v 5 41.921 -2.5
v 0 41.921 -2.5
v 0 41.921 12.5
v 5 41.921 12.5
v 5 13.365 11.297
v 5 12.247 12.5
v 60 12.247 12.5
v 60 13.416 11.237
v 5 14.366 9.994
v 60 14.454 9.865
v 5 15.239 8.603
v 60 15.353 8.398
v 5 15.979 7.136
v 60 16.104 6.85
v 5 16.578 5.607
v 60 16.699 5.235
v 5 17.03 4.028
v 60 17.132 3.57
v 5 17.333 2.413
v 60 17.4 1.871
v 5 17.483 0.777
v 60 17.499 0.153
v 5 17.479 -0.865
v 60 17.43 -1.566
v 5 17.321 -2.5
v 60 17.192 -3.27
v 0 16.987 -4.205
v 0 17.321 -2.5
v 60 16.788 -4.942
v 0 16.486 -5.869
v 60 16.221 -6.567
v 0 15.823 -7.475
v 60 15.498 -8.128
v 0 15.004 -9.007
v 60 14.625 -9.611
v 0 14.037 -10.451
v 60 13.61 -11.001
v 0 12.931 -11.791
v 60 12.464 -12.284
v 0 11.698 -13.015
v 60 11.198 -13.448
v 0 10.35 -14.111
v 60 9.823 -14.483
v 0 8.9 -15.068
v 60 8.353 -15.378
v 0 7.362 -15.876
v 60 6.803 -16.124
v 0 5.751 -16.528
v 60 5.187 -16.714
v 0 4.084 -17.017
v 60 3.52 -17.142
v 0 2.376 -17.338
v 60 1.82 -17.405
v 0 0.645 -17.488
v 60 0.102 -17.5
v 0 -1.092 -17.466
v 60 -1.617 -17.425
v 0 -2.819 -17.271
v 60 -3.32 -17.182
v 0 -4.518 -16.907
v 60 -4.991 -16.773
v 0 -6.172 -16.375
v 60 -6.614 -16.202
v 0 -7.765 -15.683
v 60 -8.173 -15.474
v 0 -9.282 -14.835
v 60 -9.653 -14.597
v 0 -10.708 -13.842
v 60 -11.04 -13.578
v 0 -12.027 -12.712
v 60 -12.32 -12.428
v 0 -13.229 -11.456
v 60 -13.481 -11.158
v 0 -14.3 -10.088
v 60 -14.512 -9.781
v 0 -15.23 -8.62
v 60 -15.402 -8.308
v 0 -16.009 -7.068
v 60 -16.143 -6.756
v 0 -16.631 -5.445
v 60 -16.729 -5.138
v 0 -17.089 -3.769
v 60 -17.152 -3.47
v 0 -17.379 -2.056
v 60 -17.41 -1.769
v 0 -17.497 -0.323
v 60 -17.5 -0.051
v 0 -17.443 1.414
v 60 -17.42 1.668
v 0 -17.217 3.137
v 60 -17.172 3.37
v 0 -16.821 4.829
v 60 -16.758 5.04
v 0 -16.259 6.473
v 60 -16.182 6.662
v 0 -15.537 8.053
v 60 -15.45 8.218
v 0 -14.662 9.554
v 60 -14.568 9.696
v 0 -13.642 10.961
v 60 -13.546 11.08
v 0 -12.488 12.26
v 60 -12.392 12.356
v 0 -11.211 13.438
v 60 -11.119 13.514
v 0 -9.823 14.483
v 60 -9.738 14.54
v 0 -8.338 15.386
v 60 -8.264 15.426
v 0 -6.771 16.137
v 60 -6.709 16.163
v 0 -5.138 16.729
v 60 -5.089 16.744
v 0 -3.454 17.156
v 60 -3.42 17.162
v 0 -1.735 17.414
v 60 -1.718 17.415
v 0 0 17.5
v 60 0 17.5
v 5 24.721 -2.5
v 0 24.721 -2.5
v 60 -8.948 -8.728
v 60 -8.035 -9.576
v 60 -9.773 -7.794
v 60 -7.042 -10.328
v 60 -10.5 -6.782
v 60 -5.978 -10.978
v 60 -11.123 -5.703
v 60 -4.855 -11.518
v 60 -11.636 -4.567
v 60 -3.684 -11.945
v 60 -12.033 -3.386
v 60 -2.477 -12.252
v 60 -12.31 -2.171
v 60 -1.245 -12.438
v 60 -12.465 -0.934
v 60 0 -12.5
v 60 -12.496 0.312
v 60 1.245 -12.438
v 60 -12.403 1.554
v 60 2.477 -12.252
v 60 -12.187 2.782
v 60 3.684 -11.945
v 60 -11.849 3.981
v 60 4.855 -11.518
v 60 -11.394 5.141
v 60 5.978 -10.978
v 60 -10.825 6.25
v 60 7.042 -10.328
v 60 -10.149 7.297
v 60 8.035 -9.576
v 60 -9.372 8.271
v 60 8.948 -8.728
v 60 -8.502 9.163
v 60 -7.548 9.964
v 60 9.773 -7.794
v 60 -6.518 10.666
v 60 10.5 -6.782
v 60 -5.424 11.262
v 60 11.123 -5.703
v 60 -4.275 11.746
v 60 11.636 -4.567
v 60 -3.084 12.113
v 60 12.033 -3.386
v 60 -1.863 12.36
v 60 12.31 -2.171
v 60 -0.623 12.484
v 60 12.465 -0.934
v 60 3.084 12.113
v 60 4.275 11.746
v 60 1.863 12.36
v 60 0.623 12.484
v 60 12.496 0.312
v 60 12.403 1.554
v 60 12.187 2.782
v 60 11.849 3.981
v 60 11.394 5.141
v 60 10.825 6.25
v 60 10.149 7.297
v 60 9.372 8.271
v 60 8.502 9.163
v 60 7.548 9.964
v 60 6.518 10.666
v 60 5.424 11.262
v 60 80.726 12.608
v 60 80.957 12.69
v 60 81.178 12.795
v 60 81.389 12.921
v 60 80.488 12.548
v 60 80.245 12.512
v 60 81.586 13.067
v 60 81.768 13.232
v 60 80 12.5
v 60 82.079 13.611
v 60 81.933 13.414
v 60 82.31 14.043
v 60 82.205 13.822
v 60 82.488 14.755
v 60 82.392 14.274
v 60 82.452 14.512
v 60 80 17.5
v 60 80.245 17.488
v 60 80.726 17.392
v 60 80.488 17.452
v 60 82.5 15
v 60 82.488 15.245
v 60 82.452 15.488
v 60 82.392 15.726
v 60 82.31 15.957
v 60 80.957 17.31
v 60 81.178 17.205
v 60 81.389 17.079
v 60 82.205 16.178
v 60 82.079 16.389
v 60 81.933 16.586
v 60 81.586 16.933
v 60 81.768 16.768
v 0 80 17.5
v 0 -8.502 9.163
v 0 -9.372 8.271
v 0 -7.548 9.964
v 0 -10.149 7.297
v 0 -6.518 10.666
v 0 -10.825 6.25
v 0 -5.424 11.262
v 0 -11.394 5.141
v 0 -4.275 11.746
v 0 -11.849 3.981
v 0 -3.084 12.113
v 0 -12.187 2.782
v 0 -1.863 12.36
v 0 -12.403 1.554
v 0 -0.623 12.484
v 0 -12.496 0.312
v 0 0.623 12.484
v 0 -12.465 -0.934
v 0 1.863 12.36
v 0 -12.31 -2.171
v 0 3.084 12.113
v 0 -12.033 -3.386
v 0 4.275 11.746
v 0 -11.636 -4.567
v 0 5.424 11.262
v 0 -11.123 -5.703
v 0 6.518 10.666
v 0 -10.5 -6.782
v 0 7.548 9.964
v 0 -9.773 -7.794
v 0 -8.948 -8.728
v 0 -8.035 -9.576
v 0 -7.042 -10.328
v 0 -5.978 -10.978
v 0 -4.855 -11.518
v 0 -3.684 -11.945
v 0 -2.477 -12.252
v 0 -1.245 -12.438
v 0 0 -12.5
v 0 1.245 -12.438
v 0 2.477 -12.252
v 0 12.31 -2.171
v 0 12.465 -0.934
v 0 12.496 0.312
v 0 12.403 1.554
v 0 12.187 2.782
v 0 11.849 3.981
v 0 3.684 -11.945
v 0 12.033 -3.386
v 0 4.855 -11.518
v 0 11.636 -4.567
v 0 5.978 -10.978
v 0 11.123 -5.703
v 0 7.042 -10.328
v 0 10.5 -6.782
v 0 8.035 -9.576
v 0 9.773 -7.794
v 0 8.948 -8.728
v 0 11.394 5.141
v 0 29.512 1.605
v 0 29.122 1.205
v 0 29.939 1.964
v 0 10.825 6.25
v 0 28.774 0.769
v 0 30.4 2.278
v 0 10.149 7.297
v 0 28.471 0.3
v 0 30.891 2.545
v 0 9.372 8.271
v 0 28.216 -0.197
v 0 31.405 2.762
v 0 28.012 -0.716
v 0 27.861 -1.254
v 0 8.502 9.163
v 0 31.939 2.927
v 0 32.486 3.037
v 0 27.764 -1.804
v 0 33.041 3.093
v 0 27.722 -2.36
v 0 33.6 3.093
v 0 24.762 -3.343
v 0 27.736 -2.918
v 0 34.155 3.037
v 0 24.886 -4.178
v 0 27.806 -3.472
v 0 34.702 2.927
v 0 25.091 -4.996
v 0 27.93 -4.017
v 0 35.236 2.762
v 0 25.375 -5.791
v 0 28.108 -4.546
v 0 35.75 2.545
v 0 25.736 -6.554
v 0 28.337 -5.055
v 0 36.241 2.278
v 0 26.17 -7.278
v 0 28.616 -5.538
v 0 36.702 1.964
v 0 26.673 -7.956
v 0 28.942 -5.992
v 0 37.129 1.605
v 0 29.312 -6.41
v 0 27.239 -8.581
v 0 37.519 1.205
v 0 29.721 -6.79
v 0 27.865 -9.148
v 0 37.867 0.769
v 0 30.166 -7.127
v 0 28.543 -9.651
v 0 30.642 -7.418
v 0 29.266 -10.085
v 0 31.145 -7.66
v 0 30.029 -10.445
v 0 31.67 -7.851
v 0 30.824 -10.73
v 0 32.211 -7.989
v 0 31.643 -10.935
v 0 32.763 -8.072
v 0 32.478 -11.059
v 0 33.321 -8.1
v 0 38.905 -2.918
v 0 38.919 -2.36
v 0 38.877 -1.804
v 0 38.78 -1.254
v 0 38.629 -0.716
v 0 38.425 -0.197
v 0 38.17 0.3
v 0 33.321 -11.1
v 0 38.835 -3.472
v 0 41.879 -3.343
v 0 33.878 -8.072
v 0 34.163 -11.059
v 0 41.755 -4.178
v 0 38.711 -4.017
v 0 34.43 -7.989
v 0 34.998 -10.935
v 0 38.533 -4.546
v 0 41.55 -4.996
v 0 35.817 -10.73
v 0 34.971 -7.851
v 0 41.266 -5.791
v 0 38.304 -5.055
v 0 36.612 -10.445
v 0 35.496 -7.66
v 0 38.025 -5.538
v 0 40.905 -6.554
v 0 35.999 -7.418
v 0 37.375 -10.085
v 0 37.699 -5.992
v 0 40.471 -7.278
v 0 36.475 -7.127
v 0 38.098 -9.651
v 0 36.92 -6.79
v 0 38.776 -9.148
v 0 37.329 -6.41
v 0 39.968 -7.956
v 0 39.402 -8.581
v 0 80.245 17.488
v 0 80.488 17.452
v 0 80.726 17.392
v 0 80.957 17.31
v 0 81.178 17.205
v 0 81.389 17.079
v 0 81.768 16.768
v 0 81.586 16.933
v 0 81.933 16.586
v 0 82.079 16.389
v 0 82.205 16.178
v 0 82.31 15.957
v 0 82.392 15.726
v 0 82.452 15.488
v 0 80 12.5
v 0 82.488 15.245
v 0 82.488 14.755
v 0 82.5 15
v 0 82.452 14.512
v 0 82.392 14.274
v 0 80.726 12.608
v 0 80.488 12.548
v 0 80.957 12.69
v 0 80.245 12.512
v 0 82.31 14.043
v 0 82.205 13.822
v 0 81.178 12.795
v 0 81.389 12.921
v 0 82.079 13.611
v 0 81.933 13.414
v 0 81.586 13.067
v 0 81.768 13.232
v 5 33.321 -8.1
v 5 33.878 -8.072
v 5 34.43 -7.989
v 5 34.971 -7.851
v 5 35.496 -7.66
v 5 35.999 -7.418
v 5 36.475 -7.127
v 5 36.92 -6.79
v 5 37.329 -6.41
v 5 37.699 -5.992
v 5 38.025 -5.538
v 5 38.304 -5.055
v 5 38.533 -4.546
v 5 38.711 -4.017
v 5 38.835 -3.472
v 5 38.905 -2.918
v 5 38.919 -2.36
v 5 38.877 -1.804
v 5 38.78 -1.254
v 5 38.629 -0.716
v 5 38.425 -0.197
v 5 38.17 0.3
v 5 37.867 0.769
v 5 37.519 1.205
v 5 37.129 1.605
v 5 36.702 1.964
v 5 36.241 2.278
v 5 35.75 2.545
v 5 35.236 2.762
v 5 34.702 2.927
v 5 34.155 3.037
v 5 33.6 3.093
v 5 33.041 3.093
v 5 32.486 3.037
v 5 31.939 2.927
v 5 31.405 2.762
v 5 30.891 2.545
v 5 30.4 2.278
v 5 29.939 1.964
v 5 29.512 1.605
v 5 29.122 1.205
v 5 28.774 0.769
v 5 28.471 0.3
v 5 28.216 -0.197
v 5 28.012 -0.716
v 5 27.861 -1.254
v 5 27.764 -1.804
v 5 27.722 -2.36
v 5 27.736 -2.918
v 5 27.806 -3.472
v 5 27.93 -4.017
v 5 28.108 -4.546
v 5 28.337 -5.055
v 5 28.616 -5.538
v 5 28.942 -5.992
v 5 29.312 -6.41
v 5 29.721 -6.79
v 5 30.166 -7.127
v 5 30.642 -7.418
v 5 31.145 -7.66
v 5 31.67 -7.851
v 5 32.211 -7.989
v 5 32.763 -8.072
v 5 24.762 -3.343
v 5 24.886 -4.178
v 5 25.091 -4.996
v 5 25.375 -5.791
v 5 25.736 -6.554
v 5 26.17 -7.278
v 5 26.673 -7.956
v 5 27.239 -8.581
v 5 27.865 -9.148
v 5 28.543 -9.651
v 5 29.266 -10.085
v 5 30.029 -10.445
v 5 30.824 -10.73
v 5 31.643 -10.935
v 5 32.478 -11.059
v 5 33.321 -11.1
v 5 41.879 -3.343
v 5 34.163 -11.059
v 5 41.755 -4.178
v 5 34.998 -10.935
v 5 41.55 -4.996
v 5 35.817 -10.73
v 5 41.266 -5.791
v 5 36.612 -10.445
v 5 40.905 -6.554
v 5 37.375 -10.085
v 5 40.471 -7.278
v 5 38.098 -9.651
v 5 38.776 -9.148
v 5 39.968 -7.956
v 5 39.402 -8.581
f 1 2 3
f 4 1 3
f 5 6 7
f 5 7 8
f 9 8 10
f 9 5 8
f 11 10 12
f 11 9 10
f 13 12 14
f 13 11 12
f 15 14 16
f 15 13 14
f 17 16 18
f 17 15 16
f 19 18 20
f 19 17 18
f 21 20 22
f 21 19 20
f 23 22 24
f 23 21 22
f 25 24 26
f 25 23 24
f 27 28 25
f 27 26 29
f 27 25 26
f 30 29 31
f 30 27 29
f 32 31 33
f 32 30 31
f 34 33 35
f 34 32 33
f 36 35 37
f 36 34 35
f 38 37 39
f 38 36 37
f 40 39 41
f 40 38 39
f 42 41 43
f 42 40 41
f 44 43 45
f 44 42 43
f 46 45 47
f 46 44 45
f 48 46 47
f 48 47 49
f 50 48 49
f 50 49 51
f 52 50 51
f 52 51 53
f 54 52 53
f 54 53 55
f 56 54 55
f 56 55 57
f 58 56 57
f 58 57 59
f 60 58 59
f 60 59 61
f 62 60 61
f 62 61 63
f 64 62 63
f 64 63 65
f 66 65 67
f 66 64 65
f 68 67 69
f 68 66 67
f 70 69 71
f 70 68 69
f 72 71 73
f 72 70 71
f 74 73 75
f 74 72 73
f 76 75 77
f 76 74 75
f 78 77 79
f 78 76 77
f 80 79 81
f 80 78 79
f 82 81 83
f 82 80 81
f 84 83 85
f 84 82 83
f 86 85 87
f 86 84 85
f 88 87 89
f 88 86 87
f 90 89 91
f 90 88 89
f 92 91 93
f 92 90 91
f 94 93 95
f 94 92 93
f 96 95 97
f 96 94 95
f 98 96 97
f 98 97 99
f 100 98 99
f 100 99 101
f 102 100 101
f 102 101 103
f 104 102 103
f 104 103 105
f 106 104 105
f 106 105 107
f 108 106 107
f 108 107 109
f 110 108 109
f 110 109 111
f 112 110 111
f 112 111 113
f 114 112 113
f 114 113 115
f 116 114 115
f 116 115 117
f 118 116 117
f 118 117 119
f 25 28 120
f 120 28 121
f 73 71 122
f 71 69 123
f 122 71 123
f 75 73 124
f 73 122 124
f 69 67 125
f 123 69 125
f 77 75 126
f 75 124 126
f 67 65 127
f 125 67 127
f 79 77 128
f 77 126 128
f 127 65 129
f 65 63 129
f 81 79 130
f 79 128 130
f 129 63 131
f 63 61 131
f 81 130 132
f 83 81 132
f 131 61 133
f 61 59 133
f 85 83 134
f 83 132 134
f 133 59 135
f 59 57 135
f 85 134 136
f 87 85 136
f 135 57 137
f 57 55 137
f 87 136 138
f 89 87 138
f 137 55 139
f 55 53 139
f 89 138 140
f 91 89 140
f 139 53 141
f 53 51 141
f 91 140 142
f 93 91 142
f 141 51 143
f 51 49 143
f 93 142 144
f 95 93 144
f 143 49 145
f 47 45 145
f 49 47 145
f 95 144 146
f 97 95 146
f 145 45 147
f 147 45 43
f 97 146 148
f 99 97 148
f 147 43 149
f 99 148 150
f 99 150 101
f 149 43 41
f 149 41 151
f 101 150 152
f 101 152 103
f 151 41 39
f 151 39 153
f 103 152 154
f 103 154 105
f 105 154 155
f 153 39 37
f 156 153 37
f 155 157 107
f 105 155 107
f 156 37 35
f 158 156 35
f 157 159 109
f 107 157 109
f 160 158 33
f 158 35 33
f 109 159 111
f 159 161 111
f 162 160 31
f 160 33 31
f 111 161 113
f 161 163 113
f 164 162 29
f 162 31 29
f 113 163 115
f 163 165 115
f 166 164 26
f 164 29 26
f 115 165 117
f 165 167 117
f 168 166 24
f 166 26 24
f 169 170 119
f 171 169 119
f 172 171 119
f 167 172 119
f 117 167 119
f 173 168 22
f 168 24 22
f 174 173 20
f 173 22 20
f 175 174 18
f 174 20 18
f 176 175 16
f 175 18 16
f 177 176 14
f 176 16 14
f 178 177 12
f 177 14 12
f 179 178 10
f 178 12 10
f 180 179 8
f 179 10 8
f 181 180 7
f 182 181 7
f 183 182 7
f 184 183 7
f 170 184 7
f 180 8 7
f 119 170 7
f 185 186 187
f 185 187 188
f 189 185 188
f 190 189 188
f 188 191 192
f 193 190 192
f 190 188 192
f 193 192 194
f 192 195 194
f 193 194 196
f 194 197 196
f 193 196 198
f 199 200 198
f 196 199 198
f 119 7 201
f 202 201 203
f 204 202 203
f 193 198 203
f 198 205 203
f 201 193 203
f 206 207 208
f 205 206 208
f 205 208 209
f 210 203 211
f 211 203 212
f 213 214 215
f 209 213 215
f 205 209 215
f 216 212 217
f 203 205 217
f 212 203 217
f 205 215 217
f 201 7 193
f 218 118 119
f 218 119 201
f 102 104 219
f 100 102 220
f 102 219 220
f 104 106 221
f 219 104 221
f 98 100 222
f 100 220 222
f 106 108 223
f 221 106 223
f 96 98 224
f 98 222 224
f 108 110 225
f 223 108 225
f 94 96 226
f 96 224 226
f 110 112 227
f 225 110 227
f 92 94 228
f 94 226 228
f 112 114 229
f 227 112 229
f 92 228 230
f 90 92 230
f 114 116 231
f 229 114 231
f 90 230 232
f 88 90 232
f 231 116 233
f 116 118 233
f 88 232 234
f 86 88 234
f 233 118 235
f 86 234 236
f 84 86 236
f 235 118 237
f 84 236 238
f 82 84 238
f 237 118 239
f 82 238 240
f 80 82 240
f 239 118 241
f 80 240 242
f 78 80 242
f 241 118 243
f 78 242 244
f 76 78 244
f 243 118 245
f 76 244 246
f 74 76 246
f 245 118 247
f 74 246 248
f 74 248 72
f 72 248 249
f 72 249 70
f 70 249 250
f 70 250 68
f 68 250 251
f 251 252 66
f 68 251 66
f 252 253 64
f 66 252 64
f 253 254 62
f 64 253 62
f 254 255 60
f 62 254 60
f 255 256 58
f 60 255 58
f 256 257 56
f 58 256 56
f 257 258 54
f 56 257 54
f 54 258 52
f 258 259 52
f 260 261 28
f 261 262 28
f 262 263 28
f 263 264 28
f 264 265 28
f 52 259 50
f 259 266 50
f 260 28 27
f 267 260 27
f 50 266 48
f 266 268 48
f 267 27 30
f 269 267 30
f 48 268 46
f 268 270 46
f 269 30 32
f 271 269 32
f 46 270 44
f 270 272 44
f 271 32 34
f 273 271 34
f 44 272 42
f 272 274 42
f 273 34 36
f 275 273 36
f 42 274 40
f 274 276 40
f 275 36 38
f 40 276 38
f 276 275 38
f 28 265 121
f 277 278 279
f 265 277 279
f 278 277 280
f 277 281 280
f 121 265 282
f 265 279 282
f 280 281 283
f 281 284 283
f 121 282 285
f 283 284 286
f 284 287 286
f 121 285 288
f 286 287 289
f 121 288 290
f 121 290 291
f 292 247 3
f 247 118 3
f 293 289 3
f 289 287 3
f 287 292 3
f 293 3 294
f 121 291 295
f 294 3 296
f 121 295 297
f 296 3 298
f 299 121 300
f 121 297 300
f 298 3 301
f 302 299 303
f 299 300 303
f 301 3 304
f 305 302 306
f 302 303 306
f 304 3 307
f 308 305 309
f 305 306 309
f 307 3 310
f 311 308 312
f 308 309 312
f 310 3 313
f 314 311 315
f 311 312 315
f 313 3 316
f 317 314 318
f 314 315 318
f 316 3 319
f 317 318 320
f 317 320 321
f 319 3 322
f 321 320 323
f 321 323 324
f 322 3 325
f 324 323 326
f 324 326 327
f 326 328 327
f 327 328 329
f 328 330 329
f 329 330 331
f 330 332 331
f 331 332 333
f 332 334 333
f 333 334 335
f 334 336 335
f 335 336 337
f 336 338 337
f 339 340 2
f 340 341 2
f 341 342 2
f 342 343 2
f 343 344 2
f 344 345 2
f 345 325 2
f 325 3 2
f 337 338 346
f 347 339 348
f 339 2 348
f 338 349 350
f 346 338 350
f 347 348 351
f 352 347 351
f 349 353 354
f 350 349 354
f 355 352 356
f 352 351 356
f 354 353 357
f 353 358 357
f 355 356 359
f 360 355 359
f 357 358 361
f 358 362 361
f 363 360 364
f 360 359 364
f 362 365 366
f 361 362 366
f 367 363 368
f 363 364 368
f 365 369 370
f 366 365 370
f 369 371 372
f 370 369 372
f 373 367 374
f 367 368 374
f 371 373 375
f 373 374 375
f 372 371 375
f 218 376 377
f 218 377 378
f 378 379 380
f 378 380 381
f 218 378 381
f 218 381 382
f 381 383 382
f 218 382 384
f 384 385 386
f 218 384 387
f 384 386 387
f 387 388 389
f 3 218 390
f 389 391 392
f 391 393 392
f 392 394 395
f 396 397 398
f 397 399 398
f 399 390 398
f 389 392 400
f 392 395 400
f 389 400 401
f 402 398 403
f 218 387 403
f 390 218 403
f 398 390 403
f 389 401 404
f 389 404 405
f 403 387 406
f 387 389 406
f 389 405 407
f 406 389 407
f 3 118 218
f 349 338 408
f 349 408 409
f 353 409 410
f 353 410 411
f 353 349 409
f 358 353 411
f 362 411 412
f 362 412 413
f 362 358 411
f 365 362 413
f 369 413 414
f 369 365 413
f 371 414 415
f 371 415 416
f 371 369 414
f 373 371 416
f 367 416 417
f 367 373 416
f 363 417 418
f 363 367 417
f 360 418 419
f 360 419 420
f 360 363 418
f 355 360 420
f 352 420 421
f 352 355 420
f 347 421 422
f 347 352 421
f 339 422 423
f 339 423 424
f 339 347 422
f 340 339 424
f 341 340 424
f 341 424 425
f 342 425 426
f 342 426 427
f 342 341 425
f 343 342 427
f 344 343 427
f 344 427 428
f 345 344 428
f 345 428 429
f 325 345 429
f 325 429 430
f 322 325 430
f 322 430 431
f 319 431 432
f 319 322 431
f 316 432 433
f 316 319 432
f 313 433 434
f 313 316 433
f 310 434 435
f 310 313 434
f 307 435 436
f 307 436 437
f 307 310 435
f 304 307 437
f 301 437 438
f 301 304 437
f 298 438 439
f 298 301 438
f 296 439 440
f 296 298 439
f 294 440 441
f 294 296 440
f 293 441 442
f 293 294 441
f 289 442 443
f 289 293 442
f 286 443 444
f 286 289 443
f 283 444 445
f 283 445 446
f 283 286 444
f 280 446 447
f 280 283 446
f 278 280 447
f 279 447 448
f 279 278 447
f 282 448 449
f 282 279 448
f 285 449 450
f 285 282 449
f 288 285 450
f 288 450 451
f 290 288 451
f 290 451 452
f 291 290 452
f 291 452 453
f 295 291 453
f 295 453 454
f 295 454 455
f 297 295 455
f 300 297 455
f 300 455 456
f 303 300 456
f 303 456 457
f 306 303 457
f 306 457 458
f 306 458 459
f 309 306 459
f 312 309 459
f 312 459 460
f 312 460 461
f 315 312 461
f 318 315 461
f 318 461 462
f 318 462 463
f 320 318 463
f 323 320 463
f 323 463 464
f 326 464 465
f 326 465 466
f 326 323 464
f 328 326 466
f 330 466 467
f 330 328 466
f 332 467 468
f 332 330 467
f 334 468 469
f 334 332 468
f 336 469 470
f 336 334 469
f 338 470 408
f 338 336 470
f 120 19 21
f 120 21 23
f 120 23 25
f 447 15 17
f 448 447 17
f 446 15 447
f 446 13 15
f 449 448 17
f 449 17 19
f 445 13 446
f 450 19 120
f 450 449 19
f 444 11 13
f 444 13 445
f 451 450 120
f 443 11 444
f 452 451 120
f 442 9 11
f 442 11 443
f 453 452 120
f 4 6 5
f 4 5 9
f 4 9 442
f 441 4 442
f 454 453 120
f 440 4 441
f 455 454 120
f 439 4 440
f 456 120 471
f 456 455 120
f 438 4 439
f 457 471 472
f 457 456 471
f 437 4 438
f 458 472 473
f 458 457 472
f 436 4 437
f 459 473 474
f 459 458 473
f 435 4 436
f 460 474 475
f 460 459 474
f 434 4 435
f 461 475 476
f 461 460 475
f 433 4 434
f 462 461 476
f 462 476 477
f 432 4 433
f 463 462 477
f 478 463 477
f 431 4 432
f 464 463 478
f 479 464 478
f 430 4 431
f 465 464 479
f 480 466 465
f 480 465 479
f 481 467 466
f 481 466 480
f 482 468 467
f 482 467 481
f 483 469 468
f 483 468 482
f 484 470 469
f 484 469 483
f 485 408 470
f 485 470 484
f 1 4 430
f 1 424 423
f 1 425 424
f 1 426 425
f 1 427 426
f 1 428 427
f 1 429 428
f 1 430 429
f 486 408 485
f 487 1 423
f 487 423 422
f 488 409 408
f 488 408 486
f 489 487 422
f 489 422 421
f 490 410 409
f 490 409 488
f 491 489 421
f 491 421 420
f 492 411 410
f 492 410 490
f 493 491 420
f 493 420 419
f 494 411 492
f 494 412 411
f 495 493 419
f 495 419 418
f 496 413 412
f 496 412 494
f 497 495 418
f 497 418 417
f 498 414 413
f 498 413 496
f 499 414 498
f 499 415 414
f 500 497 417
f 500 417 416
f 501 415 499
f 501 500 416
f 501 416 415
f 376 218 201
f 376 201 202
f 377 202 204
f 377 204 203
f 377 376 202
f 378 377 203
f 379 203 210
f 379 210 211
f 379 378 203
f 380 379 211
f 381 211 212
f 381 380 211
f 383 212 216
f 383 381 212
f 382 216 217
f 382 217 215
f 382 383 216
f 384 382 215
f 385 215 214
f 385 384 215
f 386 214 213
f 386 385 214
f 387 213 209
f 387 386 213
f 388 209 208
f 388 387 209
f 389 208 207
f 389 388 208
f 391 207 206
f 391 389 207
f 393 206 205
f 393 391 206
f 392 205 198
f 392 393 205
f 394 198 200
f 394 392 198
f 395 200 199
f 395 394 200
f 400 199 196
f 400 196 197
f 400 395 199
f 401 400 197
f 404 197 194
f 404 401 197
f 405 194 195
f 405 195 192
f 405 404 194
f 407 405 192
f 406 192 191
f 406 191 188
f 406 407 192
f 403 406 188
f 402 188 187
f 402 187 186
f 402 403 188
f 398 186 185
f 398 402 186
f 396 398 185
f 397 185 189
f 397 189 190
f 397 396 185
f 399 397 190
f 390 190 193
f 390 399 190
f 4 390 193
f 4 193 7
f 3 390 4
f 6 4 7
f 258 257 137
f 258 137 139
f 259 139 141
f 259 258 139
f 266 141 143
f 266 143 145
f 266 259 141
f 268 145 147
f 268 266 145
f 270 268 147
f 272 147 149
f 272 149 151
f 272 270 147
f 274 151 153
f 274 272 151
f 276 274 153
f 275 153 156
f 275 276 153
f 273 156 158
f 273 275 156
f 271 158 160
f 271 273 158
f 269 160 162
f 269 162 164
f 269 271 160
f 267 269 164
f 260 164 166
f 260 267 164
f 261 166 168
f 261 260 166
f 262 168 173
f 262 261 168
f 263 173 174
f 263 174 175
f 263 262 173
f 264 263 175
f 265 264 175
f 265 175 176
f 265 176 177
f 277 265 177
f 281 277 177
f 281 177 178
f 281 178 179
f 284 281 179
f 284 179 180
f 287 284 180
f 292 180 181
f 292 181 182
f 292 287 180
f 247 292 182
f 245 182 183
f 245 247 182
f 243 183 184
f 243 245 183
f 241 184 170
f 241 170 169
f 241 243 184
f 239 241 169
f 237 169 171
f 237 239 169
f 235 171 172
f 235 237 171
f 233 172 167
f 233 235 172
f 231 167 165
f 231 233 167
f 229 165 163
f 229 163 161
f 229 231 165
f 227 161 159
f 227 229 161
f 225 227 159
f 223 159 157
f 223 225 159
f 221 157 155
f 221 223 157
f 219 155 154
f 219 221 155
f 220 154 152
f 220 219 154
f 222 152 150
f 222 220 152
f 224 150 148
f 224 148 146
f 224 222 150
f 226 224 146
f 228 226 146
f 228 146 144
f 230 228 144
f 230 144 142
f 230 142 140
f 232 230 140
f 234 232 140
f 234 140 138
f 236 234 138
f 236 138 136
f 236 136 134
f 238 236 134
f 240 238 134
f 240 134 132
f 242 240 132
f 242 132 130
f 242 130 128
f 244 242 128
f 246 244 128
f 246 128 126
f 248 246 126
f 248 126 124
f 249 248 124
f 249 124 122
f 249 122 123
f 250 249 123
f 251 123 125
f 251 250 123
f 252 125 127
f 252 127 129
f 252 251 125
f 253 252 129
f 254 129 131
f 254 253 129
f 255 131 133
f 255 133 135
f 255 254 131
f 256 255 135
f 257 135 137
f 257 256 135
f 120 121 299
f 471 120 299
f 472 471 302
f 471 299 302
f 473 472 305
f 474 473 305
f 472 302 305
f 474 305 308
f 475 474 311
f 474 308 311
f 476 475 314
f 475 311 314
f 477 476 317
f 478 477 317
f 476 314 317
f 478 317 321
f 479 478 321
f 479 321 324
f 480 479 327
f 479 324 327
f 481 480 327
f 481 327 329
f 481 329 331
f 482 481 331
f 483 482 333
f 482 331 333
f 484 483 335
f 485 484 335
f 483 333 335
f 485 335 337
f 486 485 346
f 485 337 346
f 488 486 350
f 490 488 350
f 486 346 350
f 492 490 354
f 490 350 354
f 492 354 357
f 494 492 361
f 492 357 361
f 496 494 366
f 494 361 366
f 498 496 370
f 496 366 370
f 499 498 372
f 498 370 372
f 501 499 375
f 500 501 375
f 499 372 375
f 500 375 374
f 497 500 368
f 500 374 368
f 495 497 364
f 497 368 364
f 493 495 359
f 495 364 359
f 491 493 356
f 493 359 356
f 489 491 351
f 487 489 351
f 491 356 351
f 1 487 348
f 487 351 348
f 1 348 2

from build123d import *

# Parameters (mm, degrees)
SKETCH1_R           = 12.5
BOSS_EXTRUDE1_DEPTH = 60
SKETCH2_R           = 5.6
BOSS_EXTRUDE2_DEPTH = 5


with BuildPart() as part:
    # Sketch1 → Boss-Extrude1 (new body)
    with BuildSketch(Plane(origin=(0, 0, 0), x_dir=(0, 0, -1), z_dir=(1, 0, 0))):
        with BuildLine():
            Line((-17.5, 0), (-17.5, 80))
            ThreePointArc((-17.5, 80), (-15, 82.5), (-12.5, 80))
            Line((-12.5, 80), (-12.5, 12.247448714))
            ThreePointArc((-12.5, 12.247448714), (16.201851746, -6.614378278), (-17.5, 0))
        make_face()
        Circle(SKETCH1_R, mode=Mode.SUBTRACT)
    extrude(amount=BOSS_EXTRUDE1_DEPTH)

    # Sketch2 → Boss-Extrude2 (add)
    with BuildSketch(Plane(origin=(0, 0, 0), x_dir=(0, 0, -1), z_dir=(1, 0, 0))):
        with BuildLine():
            ThreePointArc((2.5, 24.720508076), (11.1, 33.320508076), (2.5, 41.920508076))
            Line((2.5, 41.920508076), (-12.5, 41.920508076))
            Line((-12.5, 41.920508076), (-12.5, 12.247448714))
            ThreePointArc((-12.5, 12.247448714), (-5.606601718, 16.577575733), (2.5, 17.320508076))
            Line((2.5, 17.320508076), (2.5, 24.720508076))
        make_face()
        with Locations((2.5, 33.320508076)):
            Circle(SKETCH2_R, mode=Mode.SUBTRACT)
    extrude(amount=BOSS_EXTRUDE2_DEPTH)


solid = part.part
